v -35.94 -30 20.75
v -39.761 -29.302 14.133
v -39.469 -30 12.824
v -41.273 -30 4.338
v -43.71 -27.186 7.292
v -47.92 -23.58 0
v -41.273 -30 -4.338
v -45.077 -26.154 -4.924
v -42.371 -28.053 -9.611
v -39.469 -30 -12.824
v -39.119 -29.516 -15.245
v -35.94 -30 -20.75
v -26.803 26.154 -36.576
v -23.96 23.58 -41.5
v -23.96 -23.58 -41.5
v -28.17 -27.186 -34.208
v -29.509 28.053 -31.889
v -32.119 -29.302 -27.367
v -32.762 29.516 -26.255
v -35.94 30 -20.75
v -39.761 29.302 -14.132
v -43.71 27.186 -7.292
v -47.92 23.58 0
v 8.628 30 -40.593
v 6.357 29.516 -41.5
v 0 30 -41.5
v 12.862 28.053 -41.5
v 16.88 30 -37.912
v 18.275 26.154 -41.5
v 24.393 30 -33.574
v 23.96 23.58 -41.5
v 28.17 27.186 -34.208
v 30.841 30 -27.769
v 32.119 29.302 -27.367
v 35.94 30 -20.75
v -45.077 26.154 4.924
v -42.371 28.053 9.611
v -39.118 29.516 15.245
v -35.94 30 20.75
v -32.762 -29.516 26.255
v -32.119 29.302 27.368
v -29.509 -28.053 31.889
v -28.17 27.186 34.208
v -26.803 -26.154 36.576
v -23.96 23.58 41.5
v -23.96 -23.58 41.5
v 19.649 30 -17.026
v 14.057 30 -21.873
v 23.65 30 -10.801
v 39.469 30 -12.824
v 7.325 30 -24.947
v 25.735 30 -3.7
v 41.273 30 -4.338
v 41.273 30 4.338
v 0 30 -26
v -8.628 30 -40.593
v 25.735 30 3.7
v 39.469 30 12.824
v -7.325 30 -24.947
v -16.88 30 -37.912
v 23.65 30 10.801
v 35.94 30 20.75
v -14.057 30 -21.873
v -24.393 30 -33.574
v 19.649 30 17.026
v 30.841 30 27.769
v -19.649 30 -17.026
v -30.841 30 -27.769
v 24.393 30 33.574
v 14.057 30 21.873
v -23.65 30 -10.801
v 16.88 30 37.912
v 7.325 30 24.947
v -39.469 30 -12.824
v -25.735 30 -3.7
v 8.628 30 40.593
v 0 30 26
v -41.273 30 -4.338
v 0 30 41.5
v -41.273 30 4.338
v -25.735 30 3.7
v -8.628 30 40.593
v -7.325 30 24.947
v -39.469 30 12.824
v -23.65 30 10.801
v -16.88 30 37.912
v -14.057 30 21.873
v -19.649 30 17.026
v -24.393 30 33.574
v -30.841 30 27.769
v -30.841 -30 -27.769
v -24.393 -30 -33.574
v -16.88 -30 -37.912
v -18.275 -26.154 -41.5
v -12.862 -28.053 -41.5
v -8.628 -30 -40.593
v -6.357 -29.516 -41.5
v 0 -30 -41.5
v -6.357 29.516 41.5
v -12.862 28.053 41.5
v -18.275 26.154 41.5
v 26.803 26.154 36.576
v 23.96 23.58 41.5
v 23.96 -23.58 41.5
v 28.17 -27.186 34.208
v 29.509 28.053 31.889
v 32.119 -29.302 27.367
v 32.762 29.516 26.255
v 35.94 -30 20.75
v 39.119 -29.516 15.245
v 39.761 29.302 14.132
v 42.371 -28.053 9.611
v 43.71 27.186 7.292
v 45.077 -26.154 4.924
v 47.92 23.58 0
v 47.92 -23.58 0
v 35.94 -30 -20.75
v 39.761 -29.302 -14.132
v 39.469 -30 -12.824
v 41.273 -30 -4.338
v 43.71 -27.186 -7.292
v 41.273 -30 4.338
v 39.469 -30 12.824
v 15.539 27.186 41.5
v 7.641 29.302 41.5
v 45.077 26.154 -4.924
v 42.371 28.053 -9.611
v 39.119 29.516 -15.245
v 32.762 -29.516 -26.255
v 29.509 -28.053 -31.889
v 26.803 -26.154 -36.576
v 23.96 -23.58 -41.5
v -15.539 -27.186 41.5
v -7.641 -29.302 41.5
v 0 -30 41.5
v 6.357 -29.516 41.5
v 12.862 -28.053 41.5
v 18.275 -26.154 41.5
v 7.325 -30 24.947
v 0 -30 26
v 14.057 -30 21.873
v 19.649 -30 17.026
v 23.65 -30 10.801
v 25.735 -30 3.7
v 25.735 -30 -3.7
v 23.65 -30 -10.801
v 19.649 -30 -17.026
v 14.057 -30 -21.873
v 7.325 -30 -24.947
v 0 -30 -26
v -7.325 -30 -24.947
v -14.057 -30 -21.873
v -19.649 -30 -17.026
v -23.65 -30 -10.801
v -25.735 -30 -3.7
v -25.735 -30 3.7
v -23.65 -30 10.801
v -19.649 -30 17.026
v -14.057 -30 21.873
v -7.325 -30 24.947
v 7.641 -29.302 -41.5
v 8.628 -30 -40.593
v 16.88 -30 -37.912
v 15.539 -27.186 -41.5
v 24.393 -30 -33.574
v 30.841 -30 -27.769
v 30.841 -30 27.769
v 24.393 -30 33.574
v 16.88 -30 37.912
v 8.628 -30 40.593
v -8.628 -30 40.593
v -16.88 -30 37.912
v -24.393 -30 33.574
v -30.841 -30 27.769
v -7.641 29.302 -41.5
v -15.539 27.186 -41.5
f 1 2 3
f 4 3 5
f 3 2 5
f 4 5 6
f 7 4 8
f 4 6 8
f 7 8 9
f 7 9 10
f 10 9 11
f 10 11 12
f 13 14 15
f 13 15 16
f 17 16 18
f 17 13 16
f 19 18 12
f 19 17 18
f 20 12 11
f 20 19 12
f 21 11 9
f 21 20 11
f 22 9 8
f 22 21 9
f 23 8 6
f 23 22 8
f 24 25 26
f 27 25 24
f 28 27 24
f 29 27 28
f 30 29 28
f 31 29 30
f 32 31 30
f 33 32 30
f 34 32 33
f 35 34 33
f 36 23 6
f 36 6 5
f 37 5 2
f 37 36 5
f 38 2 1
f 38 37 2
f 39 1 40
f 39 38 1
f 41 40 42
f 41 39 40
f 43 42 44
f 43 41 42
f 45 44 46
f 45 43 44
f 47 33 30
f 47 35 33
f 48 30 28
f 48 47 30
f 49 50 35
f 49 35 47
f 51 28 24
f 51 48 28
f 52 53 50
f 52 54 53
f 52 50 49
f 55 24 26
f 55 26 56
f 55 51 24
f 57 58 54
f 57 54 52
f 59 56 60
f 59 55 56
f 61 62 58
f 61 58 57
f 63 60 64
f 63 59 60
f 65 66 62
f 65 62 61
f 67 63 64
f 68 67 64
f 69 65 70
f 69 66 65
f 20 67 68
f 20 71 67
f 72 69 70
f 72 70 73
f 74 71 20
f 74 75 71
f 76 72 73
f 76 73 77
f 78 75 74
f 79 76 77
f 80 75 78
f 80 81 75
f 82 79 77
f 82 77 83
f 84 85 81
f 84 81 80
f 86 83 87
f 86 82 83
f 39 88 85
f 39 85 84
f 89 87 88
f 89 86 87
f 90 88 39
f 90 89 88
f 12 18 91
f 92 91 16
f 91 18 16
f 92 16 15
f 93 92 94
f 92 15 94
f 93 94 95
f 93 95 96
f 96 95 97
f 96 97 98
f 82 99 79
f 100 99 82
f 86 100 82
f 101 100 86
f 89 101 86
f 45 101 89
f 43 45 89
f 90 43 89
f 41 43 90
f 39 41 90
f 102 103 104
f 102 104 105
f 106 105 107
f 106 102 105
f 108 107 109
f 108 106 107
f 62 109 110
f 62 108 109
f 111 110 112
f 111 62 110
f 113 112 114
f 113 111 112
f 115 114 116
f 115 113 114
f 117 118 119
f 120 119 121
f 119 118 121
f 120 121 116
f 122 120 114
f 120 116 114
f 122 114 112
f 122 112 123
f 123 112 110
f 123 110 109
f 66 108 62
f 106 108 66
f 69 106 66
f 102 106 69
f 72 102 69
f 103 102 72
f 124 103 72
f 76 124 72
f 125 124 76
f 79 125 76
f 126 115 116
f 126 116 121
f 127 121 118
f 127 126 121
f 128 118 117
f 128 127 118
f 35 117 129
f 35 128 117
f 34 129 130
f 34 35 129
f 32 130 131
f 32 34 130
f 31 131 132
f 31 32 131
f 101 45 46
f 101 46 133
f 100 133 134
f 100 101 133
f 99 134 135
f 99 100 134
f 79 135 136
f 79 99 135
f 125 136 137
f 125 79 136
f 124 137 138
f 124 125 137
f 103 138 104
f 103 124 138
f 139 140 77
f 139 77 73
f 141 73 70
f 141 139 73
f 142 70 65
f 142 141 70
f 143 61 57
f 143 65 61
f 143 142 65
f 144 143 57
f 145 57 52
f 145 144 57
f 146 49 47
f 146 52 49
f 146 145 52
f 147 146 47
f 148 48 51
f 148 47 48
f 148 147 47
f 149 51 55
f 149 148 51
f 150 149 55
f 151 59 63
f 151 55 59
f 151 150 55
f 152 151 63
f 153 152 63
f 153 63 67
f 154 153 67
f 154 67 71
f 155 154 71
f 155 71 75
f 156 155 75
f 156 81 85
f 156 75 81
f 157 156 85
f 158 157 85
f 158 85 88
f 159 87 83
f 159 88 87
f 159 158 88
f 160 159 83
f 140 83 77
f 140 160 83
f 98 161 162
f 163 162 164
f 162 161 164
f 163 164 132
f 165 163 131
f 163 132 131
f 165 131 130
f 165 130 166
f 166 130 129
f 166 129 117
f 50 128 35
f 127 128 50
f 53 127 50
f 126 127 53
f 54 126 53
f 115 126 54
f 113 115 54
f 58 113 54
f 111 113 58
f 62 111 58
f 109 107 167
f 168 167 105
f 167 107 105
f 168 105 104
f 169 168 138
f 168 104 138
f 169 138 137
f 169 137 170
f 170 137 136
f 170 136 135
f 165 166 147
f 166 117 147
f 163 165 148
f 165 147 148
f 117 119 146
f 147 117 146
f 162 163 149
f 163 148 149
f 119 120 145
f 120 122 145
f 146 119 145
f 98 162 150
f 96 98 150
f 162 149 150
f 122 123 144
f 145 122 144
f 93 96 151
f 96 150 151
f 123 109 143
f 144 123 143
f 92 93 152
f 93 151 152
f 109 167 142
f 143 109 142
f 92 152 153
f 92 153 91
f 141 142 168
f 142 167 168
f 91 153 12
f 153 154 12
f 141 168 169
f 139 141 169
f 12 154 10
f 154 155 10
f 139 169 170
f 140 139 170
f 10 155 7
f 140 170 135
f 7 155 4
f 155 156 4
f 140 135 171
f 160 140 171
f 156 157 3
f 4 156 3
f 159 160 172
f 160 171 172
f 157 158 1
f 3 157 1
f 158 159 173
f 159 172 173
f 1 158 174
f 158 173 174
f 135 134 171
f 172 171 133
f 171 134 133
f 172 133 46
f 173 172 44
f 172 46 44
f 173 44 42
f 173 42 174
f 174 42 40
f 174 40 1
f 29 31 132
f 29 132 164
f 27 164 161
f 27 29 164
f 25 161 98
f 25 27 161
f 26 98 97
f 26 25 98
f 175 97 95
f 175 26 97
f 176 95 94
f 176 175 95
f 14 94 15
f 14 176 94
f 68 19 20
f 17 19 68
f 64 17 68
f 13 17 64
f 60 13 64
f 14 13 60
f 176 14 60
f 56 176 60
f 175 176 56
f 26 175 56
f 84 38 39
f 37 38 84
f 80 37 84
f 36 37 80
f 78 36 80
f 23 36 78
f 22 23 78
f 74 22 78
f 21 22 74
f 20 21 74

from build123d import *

# Parameters (mm, degrees)
BOSS_EXTRUDE1_DEPTH          = 30
CUT_EXTRUDE1_DEPTH           = 88.284496523
CUT_EXTRUDE1_DEPTH_BACK      = 88.284496523
SKETCH2_R                    = 26
SKETCH3_OUTSIDE_W            = 302.462
SKETCH3_OUTSIDE_H            = 289.622
SKETCH3_OUTSIDE_R            = 41.5
CUT_EXTRUDE2_DEPTH           = 88.284496523
CUT_EXTRUDE2_TAPER           = 45
CUT_EXTRUDE2_OTHER_WAY_DEPTH = 88.284496523


with BuildPart() as part:
    # Sketch1 → Boss-Extrude1 (new, symmetric)
    with BuildSketch(Plane(origin=(0, 0, 0), x_dir=(-1, 0, 0), z_dir=(0, 1, 0))):
        Polygon((47.920072343, 0), (23.960036171, 41.5), (-23.960036171, 41.5), (-47.920072343, 0), (-23.960036171, -41.5), (23.960036171, -41.5), align=None)
    extrude(amount=BOSS_EXTRUDE1_DEPTH, both=True)

    # Sketch2 → Cut-Extrude1 (cut, two sides: drawn at the far end of the back side and taken through both)
    with BuildSketch(Plane(origin=(0, 30, 0), x_dir=(-1, 0, 0), z_dir=(0, 1, 0)).offset(-CUT_EXTRUDE1_DEPTH_BACK)):
        with Locations(Location((0, 0, 0), (0, 0, 90))):
            Circle(SKETCH2_R)
    extrude(amount=CUT_EXTRUDE1_DEPTH + CUT_EXTRUDE1_DEPTH_BACK, mode=Mode.SUBTRACT)

    # Sketch3 outside → Cut-Extrude2 (cut)
    with BuildSketch(Plane(origin=(0, 30, 0), x_dir=(-1, 0, 0), z_dir=(0, 1, 0))):
        Rectangle(SKETCH3_OUTSIDE_W, SKETCH3_OUTSIDE_H)
        Circle(SKETCH3_OUTSIDE_R, mode=Mode.SUBTRACT)
    cut_extrude2 = extrude(amount=-CUT_EXTRUDE2_DEPTH, taper=CUT_EXTRUDE2_TAPER, mode=Mode.SUBTRACT)

    # Sketch3 outside → Cut-Extrude2 other way (cut)
    with BuildSketch(Plane(origin=(0, 30, 0), x_dir=(-1, 0, 0), z_dir=(0, 1, 0))):
        Rectangle(SKETCH3_OUTSIDE_W, SKETCH3_OUTSIDE_H)
        Circle(SKETCH3_OUTSIDE_R, mode=Mode.SUBTRACT)
    extrude(amount=CUT_EXTRUDE2_OTHER_WAY_DEPTH, mode=Mode.SUBTRACT)

    # Mirror1: Cut-Extrude2 across plane
    add(cut_extrude2.mirror(Plane.ZX), mode=Mode.SUBTRACT)


solid = part.part
